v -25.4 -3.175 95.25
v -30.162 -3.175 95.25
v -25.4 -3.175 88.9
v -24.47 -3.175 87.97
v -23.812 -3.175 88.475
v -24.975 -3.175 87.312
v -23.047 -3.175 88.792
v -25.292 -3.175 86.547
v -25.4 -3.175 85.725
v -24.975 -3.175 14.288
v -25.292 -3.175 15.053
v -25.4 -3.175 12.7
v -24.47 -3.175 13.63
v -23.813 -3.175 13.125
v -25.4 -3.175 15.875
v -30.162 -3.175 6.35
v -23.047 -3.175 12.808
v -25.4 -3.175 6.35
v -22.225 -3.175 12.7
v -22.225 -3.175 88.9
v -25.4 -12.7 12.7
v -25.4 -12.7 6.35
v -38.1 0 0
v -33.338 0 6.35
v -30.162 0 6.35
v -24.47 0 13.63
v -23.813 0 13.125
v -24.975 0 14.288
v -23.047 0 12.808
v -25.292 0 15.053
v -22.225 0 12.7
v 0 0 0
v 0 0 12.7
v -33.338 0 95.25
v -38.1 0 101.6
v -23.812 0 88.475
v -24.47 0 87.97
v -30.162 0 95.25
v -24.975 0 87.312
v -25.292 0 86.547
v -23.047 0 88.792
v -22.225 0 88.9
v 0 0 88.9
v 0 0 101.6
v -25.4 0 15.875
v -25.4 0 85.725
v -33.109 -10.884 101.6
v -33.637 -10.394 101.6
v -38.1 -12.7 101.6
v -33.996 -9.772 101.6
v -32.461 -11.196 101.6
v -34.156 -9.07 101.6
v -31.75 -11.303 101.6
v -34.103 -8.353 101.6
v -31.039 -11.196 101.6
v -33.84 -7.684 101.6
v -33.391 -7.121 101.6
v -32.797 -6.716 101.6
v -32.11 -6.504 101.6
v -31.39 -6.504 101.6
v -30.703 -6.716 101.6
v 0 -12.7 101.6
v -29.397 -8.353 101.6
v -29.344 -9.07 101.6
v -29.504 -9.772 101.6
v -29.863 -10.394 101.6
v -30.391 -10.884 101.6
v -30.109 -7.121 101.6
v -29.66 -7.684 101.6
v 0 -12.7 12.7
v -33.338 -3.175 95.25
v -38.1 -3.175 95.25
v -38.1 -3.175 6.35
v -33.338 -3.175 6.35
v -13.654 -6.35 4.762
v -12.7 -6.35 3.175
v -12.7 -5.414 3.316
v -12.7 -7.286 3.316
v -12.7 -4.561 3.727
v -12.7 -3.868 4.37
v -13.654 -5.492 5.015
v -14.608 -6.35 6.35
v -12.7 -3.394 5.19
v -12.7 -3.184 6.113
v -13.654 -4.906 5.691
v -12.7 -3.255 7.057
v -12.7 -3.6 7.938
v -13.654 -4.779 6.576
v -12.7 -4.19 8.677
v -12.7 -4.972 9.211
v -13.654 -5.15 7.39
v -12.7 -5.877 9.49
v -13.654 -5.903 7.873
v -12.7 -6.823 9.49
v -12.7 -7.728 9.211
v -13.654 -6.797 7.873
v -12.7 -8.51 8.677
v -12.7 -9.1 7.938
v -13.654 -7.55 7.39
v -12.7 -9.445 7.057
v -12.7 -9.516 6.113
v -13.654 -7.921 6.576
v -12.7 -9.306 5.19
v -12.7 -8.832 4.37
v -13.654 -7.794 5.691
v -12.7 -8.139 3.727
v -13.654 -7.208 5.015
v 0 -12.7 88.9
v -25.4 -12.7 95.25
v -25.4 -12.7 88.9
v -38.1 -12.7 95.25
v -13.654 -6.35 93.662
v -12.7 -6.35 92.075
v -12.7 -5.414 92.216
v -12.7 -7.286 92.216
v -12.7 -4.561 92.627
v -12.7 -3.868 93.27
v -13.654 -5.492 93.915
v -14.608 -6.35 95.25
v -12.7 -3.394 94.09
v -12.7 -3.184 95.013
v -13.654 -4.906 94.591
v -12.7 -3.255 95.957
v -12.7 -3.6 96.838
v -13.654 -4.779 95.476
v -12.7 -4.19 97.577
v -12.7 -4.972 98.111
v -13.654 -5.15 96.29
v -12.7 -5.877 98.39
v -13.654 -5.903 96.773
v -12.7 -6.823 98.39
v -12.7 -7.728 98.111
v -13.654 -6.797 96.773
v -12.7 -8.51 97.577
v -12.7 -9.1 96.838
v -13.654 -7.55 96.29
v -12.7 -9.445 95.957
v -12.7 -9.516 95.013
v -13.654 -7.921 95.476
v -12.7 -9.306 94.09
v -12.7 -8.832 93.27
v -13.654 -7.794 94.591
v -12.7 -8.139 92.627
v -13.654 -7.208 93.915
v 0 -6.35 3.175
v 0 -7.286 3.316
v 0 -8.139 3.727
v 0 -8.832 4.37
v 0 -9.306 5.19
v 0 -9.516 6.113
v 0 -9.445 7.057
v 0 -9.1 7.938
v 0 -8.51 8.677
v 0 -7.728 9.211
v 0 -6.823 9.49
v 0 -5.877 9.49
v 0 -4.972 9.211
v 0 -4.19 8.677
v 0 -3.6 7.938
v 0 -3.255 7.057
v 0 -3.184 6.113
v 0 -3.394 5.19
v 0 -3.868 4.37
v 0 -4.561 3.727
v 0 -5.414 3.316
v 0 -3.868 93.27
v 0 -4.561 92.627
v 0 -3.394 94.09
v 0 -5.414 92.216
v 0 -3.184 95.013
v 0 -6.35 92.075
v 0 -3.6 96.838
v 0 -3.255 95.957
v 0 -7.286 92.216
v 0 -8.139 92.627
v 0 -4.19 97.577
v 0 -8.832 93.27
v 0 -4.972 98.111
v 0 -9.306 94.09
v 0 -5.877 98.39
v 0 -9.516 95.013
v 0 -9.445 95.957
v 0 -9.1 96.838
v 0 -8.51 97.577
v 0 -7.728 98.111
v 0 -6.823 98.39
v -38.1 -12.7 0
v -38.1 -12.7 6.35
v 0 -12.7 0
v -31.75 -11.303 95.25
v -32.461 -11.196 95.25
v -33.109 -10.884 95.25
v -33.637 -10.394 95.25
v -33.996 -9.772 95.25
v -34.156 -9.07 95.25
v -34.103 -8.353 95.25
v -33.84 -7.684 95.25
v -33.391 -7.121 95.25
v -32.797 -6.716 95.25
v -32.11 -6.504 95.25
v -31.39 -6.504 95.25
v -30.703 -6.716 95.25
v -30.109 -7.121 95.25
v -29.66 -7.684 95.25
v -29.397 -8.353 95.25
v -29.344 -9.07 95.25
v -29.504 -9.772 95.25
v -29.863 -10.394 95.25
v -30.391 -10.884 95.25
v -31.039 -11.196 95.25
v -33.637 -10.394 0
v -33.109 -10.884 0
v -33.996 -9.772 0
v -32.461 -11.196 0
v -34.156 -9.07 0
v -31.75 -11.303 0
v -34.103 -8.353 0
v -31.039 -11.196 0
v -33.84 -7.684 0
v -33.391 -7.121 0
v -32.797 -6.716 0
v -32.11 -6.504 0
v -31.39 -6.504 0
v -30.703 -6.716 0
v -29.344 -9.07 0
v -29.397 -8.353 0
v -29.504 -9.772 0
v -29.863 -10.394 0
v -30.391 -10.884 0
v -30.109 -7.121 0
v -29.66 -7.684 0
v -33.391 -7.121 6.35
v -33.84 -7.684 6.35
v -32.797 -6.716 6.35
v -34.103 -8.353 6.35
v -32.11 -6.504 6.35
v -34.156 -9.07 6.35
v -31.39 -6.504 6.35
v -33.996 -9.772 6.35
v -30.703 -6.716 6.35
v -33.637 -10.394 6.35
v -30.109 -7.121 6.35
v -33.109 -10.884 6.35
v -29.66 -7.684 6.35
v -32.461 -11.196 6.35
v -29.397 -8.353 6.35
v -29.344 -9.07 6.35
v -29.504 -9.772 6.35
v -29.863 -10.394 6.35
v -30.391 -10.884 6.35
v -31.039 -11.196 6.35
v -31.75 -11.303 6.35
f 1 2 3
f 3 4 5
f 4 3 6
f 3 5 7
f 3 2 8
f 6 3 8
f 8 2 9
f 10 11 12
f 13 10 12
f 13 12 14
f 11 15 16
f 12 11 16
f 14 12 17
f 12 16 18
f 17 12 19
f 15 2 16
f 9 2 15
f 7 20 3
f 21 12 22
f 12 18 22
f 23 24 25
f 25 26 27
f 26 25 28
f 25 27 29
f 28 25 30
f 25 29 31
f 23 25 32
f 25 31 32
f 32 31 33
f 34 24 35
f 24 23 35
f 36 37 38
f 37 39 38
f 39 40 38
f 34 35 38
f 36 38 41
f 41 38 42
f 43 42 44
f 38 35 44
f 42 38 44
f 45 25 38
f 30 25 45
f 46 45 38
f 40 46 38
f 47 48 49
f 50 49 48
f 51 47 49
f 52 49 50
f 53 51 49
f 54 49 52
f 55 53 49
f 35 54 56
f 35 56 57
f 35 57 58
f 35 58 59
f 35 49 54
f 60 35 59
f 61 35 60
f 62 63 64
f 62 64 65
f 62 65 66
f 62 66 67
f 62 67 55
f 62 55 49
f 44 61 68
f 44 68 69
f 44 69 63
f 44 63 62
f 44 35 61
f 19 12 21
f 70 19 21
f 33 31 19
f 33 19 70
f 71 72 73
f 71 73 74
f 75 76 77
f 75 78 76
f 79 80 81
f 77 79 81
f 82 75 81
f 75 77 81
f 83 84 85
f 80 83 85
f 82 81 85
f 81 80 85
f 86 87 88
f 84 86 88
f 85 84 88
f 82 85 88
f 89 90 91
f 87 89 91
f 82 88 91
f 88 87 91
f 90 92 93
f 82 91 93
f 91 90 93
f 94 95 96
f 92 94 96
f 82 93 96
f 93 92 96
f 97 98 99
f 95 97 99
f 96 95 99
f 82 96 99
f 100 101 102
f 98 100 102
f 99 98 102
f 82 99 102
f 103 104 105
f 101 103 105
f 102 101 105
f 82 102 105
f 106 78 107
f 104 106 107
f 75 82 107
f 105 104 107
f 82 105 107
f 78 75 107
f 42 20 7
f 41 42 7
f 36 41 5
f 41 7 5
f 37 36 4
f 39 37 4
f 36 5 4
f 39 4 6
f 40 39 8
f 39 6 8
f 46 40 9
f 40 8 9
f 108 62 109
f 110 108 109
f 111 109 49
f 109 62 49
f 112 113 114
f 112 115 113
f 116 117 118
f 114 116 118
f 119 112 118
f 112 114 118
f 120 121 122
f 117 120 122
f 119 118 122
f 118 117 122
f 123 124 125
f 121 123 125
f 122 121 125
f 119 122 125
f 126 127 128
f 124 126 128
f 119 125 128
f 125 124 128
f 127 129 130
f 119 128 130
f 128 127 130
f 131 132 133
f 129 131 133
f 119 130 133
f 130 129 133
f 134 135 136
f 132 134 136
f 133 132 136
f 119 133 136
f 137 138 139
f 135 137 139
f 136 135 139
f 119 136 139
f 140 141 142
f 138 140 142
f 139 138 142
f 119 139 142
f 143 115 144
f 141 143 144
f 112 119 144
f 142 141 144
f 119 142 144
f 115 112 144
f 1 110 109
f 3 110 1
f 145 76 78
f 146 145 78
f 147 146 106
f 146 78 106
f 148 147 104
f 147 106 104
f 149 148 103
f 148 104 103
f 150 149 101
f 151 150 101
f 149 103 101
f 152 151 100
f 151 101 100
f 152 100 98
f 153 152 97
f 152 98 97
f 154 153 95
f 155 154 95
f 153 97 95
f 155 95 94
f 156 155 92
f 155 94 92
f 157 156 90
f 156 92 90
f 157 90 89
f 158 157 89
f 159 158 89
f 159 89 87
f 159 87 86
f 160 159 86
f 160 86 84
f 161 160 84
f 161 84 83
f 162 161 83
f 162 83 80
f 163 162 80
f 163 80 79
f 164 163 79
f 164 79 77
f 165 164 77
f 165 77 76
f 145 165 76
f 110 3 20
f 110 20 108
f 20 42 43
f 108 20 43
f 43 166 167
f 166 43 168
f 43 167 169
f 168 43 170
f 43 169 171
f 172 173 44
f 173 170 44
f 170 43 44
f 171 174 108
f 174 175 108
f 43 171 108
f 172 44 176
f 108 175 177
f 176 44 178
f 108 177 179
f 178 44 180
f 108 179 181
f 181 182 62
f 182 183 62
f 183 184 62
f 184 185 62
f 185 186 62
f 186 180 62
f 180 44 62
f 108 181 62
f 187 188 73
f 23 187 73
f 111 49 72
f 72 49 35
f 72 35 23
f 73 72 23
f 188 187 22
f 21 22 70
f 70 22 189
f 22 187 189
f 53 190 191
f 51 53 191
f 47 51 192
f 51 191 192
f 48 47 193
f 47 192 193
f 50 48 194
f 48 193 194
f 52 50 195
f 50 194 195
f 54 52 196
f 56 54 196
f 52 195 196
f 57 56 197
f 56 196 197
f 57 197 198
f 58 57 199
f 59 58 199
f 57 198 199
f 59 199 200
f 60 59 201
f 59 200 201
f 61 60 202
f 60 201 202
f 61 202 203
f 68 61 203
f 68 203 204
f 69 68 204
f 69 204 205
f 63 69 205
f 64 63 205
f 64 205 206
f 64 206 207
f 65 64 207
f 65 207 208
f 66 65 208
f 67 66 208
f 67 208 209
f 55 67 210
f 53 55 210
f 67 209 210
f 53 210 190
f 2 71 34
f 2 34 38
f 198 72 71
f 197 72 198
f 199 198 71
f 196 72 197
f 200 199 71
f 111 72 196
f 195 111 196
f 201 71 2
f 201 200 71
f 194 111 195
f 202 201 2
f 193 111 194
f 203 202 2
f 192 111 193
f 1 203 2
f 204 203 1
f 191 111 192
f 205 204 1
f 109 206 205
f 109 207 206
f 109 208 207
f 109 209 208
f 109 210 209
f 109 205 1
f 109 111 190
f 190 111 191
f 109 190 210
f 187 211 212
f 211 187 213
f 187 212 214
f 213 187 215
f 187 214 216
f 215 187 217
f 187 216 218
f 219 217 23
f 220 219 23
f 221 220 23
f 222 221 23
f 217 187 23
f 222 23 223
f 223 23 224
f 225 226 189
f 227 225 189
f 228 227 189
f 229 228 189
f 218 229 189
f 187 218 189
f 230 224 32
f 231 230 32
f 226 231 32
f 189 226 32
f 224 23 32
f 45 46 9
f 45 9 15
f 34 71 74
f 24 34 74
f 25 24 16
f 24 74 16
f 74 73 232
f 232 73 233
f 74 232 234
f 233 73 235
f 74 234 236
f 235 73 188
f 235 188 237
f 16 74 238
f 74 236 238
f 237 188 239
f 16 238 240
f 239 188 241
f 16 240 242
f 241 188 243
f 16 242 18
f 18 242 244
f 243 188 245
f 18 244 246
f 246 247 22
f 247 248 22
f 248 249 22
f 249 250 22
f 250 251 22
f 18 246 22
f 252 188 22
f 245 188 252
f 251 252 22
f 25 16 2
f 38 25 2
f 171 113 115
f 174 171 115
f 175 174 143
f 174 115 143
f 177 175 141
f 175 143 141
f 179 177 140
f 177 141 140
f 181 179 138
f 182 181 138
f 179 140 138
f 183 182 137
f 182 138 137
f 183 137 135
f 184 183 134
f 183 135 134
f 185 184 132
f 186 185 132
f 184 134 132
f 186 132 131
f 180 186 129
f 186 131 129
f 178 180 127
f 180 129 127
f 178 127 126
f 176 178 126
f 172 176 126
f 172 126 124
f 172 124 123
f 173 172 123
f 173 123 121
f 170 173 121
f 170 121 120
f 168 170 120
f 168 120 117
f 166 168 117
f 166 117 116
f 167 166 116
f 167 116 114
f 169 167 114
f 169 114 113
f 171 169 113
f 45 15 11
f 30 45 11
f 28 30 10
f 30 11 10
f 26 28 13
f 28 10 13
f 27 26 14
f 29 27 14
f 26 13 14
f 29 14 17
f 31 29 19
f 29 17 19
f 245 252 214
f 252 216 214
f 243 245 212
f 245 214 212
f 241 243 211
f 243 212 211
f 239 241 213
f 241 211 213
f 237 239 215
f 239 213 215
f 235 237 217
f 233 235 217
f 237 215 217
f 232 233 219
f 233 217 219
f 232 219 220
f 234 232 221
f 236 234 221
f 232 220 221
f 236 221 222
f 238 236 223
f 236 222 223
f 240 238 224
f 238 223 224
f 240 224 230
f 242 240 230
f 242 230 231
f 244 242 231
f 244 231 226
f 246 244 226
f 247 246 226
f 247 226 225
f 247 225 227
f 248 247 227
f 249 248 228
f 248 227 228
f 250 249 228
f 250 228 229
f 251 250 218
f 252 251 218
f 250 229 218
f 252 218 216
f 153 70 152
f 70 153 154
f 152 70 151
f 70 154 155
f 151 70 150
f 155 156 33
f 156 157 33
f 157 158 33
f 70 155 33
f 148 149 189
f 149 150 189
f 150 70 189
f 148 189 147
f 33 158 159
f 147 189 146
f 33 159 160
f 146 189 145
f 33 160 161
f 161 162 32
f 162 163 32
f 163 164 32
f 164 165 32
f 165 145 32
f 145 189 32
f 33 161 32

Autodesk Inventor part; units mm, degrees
ref_plane "YZ Plane" through (0, 0, 0) normal (1, 0, 0) x (0, 1, 0)
ref_plane "XZ Plane" through (0, 0, 0) normal (0, 1, 0) x (-1, 0, 0)
ref_plane "XY Plane" through (0, 0, 0) normal (0, 0, 1) x (1, 0, 0)
sketch "Sketch1" plane through (0, 0, 0) normal (0, 1, 0) x (-1, 0, 0)
  line L0 (0, 0) -> (38.1, 0)
  line L1 (38.1, 0) -> (38.1, 12.7)
  line L2 (38.1, 12.7) -> (0, 12.7)
  line L3 (0, 12.7) -> (0, 0)
  dimension "d0" = 38.1
  dimension "d1" = 12.7
sketch "Sketch2" plane through (0, 0, 0) normal (0, 0, 1) x (1, 0, 0)
  line L0 (0, 0) -> (-25.4, 0)
  line L1 (-25.4, 0) -> (-25.4, -12.7)
  line L2 (-25.4, -12.7) -> (0, -12.7)
  line L3 (0, -12.7) -> (0, 0)
  dimension "d2" = 25.4
  dimension "d3" = 12.7
extrude "Extrusion1" add sketch "Sketch2" along normal blind 12.7
sketch "Sketch3" plane through (0, 0, 0) normal (0, 0, -1) x (-1, 0, 0)
  line L0 (0, 0) -> (25.4, 0) projected
  line L1 (25.4, 0) -> (38.1, 0)
  line L2 (38.1, 0) -> (38.1, -12.7)
  line L3 (38.1, -12.7) -> (25.4, -12.7)
  line L4 (25.4, -12.7) -> (25.4, 0)
  dimension "d6" = 12.7
  dimension "d7" = 12.7
extrude "Extrusion2" add sketch "Sketch3" against normal blind 6.35
sketch "Sketch4" plane through (-25.4, 0, 12.7) normal (0, 1, 0) x (1, 0, 0)
  line L0 (-12.7, 12.7) -> (25.4, 12.7) projected
  line L1 (0, 12.7) -> (-12.7, 12.7)
  line L2 (-12.7, 12.7) -> (-12.7, -88.9)
  line L3 (-12.7, -88.9) -> (0, -88.9)
  line L4 (0, -88.9) -> (0, 12.7)
  dimension "d10" = 101.6
extrude "Extrusion3" add sketch "Sketch4" against normal blind 3.175
sketch "Sketch5" plane through (-25.4, -3.175, 12.7) normal (0, -1, 0) x (1, 0, 0)
  point P0 (25.4, -12.7)
sketch "Sketch6" plane through (-38.1, 0, 101.6) normal (0, 0, 1) x (1, 0, 0)
  line L0 (12.7, -12.7) -> (38.1, -12.7) projected
  line L1 (0, 0) -> (38.1, 0)
  line L2 (38.1, 0) -> (38.1, -12.7)
  line L3 (38.1, -12.7) -> (0, -12.7)
  line L4 (0, -12.7) -> (0, 0)
extrude "Extrusion4" add sketch "Sketch6" against normal blind 12.7
sketch "Sketch7" plane through (-38.1, 0, 88.9) normal (0, 0, -1) x (-1, 0, 0)
  line L0 (0, -12.7) -> (0, -3.175) projected
  line L1 (-12.7, -3.175) -> (0, -3.175) projected
  line L2 (0, -12.7) -> (-12.7, -12.7)
  line L3 (-12.7, -12.7) -> (-12.7, -3.175)
  line L4 (-12.7, -3.175) -> (0, -3.175)
  line L5 (0, -3.175) -> (0, -12.7)
  point P0 (-38.1, 0)
extrude "Extrusion5" cut sketch "Sketch7" against normal blind 6.35
fillet "Fillet1" radius 3.175 2 edges at (-25.4, -1.5875, 12.7) (-25.4, -1.5875, 88.9)
sketch "Sketch8" plane through (-38.1, -12.7, 101.6) normal (0, 0, 1) x (1, 0, 0)
  point P0 (38.1, 12.7)
  point P1 (6.35, 3.81)
hole "Hole1" at (-31.75, -8.89, 101.6) direction (0, 0, -1) diameter 4.826 depth 107.95 tip angle 118
sketch "Sketch9" plane through (-25.4, -3.175, 12.7) normal (0, -1, 0) x (1, 0, 0)
  line L0 (-12.7, 82.55) -> (0, 82.55) projected
  line L1 (-4.7625, 82.55) -> (-7.9375, 82.55)
  line L2 (-7.9375, 82.55) -> (-7.9375, -6.35)
  line L3 (-7.9375, -6.35) -> (-4.7625, -6.35)
  line L4 (-4.7625, -6.35) -> (-4.7625, 82.55)
  point P0 (25.4, -12.7)
  point P1 (-6.35, 0)
  dimension "d25" = 3.175
  dimension "d26" = 88.9
extrude "Extrusion6" cut sketch "Sketch9" against normal blind 6.35
sketch "Sketch10" plane through (0, -12.7, 101.6) normal (1, 0, 0) x (0, 0, -1)
  line L0 (95.25, 9.525) -> (95.25, 0) projected
  point P0 (101.6, 12.7)
  point P1 (6.35, 6.35)
  point P2 (95.25, 6.35)
hole "Hole2" at (0, -6.35, 6.35) at (0, -6.35, 95.25) direction (-1, 0, 0) diameter 6.35 depth 12.7 tip angle 118
properties part number "CarBrake"
